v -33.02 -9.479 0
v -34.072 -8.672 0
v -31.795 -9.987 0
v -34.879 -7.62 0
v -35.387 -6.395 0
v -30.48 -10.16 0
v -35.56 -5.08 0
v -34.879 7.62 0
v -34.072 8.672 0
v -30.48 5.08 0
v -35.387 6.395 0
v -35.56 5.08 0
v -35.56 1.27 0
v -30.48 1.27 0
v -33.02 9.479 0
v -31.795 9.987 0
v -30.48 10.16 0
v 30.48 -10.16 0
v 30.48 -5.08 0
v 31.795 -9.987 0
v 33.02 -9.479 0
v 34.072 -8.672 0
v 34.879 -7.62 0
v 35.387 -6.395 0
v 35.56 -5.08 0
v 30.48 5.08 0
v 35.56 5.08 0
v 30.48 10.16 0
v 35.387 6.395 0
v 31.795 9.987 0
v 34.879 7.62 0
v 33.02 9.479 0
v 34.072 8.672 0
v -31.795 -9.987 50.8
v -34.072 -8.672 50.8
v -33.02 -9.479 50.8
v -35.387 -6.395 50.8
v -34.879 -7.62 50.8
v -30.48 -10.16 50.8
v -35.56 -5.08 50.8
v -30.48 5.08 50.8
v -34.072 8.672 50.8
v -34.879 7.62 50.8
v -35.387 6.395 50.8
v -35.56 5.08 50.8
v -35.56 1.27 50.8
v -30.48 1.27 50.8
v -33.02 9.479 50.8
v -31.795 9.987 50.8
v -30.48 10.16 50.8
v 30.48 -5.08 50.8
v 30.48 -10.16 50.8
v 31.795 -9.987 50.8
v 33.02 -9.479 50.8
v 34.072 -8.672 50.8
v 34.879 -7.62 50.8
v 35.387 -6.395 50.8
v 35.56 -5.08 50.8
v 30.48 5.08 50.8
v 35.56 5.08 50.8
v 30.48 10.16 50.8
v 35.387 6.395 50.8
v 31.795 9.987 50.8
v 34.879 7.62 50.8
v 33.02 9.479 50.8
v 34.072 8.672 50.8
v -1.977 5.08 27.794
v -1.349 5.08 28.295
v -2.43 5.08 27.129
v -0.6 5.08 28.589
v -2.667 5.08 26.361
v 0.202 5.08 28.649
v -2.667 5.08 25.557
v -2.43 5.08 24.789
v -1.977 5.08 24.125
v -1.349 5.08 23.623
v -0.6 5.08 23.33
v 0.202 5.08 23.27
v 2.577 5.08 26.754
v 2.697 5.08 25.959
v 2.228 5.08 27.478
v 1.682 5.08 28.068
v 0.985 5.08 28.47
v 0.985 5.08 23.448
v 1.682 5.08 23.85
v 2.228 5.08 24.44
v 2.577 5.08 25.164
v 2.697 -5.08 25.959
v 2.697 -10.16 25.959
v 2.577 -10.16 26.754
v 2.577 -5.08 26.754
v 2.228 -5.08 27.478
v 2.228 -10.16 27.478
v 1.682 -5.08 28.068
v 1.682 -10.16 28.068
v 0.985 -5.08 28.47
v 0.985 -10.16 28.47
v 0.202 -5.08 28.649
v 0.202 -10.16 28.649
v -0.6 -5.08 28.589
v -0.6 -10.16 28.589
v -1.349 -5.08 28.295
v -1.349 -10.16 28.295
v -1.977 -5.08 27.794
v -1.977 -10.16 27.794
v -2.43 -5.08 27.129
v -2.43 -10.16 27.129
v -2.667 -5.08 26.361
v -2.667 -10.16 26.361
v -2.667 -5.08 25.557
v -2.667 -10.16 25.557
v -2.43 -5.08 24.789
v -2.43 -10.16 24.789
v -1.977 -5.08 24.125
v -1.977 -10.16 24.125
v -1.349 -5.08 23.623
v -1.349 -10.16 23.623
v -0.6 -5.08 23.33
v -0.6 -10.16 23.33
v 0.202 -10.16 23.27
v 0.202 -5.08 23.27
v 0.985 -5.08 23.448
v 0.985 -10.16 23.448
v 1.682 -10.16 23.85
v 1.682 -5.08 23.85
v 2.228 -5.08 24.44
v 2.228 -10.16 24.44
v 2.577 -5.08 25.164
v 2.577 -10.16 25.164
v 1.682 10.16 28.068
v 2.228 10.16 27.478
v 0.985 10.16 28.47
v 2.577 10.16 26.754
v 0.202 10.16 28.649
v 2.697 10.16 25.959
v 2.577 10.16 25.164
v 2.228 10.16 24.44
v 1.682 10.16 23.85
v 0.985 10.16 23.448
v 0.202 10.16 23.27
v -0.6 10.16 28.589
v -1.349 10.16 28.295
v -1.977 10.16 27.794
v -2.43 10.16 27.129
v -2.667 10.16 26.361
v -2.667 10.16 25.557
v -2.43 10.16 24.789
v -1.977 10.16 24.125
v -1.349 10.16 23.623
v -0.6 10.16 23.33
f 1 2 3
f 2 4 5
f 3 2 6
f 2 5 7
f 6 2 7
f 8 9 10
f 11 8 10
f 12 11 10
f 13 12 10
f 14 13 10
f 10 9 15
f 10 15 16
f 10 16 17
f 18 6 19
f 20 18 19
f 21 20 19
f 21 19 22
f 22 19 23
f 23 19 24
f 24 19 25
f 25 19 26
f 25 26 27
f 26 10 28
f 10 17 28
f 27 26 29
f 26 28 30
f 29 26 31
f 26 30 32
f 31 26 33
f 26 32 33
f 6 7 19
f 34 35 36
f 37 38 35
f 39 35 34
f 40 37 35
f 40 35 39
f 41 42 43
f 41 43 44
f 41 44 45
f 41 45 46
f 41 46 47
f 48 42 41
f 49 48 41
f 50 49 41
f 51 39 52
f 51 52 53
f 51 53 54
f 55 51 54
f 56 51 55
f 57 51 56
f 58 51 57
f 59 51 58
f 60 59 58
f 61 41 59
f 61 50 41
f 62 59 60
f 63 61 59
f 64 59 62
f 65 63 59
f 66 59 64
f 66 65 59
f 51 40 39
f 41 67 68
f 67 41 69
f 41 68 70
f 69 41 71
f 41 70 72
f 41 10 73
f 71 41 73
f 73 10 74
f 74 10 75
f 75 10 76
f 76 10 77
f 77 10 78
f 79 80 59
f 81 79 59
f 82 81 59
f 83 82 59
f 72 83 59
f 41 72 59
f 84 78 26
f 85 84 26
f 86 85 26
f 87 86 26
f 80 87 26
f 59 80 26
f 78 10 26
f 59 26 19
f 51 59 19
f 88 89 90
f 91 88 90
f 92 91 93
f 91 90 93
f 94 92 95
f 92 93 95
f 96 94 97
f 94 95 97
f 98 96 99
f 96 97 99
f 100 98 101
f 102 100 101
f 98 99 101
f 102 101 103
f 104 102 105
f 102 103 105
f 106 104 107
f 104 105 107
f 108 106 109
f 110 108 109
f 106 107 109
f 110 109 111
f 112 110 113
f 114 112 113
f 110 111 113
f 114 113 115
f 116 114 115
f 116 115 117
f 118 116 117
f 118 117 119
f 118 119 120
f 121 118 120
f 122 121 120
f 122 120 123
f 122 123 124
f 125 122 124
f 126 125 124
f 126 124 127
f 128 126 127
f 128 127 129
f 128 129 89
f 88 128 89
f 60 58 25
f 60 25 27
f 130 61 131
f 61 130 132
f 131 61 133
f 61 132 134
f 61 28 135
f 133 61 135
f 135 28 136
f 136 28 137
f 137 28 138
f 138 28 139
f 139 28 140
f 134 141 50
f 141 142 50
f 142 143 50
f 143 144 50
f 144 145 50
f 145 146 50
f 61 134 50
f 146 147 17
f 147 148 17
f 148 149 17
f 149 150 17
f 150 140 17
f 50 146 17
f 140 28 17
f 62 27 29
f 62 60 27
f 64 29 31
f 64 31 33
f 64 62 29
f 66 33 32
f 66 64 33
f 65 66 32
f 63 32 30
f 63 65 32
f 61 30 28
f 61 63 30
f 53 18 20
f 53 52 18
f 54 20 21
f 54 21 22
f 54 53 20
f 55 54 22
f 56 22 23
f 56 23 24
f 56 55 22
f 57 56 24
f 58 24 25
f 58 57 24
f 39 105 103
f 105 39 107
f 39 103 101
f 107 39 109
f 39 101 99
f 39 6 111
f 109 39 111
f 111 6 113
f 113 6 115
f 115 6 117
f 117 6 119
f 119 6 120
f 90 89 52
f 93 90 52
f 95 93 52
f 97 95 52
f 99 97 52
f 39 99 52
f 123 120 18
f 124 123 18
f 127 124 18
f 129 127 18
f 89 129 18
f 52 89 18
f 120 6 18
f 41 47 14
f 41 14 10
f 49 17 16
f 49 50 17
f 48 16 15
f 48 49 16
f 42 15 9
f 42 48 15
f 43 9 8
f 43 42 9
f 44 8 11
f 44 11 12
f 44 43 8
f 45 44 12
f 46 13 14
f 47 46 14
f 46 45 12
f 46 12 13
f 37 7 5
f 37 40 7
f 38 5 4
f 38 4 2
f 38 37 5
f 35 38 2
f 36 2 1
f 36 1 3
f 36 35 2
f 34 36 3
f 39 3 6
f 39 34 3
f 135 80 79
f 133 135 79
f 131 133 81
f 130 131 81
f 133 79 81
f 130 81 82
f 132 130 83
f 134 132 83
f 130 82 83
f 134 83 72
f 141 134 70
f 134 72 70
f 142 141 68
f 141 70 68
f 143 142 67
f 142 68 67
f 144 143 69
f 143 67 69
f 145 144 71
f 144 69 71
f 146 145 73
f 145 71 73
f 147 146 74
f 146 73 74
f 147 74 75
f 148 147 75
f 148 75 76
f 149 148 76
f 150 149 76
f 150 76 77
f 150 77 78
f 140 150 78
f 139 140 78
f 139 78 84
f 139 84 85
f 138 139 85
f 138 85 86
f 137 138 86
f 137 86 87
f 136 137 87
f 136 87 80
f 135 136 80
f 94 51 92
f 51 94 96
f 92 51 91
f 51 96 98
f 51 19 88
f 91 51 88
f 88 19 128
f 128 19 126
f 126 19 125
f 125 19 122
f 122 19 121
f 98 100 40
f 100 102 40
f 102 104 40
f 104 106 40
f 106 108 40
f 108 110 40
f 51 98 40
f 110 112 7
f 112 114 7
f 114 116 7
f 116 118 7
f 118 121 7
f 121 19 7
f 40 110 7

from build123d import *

# Parameters (mm, degrees)
F1_DEPTH = 50.8
F2_R     = 5.07999
F3_R     = 2.6971074435
F4_DEPTH = 25.4


# Not quite as in the source:
# - a fillet or chamfer is up to 0.001 mm smaller than in the source, because OpenCascade refuses the exact size


with BuildPart() as f1:
    # F0 (on Top) → F1 (new body)
    with BuildSketch(Plane.XY):
        Polygon((-30.48, 1.27), (-30.48, 5.08), (30.48, 5.08), (30.48, -5.08), (-30.48, -5.08), (-35.56, -5.08), (-35.56, -10.16), (35.56, -10.16), (35.56, 10.16), (-35.56, 10.16), (-35.56, 1.27), align=None)
    extrude(amount=F1_DEPTH)

    # F2 (radius 5.08 in the source; OpenCascade refuses exactly that, so slightly less here)
    f2_edges = [f1.edges().sort_by_distance(p)[0] for p in [
        (35.56, 10.16, 25.4),
        (35.56, -10.16, 25.4),
        (-35.56, 10.16, 25.4),
        (-35.56, -10.16, 25.4),
    ]]
    fillet(f2_edges, radius=F2_R)

    # F3 (on face) → F4 (cut)
    with BuildSketch(Plane.XZ.offset(10.16)):
        with Locations((0, 25.9590707719)):
            Circle(F3_R)
    extrude(amount=-F4_DEPTH, mode=Mode.SUBTRACT)


solid = f1.part
